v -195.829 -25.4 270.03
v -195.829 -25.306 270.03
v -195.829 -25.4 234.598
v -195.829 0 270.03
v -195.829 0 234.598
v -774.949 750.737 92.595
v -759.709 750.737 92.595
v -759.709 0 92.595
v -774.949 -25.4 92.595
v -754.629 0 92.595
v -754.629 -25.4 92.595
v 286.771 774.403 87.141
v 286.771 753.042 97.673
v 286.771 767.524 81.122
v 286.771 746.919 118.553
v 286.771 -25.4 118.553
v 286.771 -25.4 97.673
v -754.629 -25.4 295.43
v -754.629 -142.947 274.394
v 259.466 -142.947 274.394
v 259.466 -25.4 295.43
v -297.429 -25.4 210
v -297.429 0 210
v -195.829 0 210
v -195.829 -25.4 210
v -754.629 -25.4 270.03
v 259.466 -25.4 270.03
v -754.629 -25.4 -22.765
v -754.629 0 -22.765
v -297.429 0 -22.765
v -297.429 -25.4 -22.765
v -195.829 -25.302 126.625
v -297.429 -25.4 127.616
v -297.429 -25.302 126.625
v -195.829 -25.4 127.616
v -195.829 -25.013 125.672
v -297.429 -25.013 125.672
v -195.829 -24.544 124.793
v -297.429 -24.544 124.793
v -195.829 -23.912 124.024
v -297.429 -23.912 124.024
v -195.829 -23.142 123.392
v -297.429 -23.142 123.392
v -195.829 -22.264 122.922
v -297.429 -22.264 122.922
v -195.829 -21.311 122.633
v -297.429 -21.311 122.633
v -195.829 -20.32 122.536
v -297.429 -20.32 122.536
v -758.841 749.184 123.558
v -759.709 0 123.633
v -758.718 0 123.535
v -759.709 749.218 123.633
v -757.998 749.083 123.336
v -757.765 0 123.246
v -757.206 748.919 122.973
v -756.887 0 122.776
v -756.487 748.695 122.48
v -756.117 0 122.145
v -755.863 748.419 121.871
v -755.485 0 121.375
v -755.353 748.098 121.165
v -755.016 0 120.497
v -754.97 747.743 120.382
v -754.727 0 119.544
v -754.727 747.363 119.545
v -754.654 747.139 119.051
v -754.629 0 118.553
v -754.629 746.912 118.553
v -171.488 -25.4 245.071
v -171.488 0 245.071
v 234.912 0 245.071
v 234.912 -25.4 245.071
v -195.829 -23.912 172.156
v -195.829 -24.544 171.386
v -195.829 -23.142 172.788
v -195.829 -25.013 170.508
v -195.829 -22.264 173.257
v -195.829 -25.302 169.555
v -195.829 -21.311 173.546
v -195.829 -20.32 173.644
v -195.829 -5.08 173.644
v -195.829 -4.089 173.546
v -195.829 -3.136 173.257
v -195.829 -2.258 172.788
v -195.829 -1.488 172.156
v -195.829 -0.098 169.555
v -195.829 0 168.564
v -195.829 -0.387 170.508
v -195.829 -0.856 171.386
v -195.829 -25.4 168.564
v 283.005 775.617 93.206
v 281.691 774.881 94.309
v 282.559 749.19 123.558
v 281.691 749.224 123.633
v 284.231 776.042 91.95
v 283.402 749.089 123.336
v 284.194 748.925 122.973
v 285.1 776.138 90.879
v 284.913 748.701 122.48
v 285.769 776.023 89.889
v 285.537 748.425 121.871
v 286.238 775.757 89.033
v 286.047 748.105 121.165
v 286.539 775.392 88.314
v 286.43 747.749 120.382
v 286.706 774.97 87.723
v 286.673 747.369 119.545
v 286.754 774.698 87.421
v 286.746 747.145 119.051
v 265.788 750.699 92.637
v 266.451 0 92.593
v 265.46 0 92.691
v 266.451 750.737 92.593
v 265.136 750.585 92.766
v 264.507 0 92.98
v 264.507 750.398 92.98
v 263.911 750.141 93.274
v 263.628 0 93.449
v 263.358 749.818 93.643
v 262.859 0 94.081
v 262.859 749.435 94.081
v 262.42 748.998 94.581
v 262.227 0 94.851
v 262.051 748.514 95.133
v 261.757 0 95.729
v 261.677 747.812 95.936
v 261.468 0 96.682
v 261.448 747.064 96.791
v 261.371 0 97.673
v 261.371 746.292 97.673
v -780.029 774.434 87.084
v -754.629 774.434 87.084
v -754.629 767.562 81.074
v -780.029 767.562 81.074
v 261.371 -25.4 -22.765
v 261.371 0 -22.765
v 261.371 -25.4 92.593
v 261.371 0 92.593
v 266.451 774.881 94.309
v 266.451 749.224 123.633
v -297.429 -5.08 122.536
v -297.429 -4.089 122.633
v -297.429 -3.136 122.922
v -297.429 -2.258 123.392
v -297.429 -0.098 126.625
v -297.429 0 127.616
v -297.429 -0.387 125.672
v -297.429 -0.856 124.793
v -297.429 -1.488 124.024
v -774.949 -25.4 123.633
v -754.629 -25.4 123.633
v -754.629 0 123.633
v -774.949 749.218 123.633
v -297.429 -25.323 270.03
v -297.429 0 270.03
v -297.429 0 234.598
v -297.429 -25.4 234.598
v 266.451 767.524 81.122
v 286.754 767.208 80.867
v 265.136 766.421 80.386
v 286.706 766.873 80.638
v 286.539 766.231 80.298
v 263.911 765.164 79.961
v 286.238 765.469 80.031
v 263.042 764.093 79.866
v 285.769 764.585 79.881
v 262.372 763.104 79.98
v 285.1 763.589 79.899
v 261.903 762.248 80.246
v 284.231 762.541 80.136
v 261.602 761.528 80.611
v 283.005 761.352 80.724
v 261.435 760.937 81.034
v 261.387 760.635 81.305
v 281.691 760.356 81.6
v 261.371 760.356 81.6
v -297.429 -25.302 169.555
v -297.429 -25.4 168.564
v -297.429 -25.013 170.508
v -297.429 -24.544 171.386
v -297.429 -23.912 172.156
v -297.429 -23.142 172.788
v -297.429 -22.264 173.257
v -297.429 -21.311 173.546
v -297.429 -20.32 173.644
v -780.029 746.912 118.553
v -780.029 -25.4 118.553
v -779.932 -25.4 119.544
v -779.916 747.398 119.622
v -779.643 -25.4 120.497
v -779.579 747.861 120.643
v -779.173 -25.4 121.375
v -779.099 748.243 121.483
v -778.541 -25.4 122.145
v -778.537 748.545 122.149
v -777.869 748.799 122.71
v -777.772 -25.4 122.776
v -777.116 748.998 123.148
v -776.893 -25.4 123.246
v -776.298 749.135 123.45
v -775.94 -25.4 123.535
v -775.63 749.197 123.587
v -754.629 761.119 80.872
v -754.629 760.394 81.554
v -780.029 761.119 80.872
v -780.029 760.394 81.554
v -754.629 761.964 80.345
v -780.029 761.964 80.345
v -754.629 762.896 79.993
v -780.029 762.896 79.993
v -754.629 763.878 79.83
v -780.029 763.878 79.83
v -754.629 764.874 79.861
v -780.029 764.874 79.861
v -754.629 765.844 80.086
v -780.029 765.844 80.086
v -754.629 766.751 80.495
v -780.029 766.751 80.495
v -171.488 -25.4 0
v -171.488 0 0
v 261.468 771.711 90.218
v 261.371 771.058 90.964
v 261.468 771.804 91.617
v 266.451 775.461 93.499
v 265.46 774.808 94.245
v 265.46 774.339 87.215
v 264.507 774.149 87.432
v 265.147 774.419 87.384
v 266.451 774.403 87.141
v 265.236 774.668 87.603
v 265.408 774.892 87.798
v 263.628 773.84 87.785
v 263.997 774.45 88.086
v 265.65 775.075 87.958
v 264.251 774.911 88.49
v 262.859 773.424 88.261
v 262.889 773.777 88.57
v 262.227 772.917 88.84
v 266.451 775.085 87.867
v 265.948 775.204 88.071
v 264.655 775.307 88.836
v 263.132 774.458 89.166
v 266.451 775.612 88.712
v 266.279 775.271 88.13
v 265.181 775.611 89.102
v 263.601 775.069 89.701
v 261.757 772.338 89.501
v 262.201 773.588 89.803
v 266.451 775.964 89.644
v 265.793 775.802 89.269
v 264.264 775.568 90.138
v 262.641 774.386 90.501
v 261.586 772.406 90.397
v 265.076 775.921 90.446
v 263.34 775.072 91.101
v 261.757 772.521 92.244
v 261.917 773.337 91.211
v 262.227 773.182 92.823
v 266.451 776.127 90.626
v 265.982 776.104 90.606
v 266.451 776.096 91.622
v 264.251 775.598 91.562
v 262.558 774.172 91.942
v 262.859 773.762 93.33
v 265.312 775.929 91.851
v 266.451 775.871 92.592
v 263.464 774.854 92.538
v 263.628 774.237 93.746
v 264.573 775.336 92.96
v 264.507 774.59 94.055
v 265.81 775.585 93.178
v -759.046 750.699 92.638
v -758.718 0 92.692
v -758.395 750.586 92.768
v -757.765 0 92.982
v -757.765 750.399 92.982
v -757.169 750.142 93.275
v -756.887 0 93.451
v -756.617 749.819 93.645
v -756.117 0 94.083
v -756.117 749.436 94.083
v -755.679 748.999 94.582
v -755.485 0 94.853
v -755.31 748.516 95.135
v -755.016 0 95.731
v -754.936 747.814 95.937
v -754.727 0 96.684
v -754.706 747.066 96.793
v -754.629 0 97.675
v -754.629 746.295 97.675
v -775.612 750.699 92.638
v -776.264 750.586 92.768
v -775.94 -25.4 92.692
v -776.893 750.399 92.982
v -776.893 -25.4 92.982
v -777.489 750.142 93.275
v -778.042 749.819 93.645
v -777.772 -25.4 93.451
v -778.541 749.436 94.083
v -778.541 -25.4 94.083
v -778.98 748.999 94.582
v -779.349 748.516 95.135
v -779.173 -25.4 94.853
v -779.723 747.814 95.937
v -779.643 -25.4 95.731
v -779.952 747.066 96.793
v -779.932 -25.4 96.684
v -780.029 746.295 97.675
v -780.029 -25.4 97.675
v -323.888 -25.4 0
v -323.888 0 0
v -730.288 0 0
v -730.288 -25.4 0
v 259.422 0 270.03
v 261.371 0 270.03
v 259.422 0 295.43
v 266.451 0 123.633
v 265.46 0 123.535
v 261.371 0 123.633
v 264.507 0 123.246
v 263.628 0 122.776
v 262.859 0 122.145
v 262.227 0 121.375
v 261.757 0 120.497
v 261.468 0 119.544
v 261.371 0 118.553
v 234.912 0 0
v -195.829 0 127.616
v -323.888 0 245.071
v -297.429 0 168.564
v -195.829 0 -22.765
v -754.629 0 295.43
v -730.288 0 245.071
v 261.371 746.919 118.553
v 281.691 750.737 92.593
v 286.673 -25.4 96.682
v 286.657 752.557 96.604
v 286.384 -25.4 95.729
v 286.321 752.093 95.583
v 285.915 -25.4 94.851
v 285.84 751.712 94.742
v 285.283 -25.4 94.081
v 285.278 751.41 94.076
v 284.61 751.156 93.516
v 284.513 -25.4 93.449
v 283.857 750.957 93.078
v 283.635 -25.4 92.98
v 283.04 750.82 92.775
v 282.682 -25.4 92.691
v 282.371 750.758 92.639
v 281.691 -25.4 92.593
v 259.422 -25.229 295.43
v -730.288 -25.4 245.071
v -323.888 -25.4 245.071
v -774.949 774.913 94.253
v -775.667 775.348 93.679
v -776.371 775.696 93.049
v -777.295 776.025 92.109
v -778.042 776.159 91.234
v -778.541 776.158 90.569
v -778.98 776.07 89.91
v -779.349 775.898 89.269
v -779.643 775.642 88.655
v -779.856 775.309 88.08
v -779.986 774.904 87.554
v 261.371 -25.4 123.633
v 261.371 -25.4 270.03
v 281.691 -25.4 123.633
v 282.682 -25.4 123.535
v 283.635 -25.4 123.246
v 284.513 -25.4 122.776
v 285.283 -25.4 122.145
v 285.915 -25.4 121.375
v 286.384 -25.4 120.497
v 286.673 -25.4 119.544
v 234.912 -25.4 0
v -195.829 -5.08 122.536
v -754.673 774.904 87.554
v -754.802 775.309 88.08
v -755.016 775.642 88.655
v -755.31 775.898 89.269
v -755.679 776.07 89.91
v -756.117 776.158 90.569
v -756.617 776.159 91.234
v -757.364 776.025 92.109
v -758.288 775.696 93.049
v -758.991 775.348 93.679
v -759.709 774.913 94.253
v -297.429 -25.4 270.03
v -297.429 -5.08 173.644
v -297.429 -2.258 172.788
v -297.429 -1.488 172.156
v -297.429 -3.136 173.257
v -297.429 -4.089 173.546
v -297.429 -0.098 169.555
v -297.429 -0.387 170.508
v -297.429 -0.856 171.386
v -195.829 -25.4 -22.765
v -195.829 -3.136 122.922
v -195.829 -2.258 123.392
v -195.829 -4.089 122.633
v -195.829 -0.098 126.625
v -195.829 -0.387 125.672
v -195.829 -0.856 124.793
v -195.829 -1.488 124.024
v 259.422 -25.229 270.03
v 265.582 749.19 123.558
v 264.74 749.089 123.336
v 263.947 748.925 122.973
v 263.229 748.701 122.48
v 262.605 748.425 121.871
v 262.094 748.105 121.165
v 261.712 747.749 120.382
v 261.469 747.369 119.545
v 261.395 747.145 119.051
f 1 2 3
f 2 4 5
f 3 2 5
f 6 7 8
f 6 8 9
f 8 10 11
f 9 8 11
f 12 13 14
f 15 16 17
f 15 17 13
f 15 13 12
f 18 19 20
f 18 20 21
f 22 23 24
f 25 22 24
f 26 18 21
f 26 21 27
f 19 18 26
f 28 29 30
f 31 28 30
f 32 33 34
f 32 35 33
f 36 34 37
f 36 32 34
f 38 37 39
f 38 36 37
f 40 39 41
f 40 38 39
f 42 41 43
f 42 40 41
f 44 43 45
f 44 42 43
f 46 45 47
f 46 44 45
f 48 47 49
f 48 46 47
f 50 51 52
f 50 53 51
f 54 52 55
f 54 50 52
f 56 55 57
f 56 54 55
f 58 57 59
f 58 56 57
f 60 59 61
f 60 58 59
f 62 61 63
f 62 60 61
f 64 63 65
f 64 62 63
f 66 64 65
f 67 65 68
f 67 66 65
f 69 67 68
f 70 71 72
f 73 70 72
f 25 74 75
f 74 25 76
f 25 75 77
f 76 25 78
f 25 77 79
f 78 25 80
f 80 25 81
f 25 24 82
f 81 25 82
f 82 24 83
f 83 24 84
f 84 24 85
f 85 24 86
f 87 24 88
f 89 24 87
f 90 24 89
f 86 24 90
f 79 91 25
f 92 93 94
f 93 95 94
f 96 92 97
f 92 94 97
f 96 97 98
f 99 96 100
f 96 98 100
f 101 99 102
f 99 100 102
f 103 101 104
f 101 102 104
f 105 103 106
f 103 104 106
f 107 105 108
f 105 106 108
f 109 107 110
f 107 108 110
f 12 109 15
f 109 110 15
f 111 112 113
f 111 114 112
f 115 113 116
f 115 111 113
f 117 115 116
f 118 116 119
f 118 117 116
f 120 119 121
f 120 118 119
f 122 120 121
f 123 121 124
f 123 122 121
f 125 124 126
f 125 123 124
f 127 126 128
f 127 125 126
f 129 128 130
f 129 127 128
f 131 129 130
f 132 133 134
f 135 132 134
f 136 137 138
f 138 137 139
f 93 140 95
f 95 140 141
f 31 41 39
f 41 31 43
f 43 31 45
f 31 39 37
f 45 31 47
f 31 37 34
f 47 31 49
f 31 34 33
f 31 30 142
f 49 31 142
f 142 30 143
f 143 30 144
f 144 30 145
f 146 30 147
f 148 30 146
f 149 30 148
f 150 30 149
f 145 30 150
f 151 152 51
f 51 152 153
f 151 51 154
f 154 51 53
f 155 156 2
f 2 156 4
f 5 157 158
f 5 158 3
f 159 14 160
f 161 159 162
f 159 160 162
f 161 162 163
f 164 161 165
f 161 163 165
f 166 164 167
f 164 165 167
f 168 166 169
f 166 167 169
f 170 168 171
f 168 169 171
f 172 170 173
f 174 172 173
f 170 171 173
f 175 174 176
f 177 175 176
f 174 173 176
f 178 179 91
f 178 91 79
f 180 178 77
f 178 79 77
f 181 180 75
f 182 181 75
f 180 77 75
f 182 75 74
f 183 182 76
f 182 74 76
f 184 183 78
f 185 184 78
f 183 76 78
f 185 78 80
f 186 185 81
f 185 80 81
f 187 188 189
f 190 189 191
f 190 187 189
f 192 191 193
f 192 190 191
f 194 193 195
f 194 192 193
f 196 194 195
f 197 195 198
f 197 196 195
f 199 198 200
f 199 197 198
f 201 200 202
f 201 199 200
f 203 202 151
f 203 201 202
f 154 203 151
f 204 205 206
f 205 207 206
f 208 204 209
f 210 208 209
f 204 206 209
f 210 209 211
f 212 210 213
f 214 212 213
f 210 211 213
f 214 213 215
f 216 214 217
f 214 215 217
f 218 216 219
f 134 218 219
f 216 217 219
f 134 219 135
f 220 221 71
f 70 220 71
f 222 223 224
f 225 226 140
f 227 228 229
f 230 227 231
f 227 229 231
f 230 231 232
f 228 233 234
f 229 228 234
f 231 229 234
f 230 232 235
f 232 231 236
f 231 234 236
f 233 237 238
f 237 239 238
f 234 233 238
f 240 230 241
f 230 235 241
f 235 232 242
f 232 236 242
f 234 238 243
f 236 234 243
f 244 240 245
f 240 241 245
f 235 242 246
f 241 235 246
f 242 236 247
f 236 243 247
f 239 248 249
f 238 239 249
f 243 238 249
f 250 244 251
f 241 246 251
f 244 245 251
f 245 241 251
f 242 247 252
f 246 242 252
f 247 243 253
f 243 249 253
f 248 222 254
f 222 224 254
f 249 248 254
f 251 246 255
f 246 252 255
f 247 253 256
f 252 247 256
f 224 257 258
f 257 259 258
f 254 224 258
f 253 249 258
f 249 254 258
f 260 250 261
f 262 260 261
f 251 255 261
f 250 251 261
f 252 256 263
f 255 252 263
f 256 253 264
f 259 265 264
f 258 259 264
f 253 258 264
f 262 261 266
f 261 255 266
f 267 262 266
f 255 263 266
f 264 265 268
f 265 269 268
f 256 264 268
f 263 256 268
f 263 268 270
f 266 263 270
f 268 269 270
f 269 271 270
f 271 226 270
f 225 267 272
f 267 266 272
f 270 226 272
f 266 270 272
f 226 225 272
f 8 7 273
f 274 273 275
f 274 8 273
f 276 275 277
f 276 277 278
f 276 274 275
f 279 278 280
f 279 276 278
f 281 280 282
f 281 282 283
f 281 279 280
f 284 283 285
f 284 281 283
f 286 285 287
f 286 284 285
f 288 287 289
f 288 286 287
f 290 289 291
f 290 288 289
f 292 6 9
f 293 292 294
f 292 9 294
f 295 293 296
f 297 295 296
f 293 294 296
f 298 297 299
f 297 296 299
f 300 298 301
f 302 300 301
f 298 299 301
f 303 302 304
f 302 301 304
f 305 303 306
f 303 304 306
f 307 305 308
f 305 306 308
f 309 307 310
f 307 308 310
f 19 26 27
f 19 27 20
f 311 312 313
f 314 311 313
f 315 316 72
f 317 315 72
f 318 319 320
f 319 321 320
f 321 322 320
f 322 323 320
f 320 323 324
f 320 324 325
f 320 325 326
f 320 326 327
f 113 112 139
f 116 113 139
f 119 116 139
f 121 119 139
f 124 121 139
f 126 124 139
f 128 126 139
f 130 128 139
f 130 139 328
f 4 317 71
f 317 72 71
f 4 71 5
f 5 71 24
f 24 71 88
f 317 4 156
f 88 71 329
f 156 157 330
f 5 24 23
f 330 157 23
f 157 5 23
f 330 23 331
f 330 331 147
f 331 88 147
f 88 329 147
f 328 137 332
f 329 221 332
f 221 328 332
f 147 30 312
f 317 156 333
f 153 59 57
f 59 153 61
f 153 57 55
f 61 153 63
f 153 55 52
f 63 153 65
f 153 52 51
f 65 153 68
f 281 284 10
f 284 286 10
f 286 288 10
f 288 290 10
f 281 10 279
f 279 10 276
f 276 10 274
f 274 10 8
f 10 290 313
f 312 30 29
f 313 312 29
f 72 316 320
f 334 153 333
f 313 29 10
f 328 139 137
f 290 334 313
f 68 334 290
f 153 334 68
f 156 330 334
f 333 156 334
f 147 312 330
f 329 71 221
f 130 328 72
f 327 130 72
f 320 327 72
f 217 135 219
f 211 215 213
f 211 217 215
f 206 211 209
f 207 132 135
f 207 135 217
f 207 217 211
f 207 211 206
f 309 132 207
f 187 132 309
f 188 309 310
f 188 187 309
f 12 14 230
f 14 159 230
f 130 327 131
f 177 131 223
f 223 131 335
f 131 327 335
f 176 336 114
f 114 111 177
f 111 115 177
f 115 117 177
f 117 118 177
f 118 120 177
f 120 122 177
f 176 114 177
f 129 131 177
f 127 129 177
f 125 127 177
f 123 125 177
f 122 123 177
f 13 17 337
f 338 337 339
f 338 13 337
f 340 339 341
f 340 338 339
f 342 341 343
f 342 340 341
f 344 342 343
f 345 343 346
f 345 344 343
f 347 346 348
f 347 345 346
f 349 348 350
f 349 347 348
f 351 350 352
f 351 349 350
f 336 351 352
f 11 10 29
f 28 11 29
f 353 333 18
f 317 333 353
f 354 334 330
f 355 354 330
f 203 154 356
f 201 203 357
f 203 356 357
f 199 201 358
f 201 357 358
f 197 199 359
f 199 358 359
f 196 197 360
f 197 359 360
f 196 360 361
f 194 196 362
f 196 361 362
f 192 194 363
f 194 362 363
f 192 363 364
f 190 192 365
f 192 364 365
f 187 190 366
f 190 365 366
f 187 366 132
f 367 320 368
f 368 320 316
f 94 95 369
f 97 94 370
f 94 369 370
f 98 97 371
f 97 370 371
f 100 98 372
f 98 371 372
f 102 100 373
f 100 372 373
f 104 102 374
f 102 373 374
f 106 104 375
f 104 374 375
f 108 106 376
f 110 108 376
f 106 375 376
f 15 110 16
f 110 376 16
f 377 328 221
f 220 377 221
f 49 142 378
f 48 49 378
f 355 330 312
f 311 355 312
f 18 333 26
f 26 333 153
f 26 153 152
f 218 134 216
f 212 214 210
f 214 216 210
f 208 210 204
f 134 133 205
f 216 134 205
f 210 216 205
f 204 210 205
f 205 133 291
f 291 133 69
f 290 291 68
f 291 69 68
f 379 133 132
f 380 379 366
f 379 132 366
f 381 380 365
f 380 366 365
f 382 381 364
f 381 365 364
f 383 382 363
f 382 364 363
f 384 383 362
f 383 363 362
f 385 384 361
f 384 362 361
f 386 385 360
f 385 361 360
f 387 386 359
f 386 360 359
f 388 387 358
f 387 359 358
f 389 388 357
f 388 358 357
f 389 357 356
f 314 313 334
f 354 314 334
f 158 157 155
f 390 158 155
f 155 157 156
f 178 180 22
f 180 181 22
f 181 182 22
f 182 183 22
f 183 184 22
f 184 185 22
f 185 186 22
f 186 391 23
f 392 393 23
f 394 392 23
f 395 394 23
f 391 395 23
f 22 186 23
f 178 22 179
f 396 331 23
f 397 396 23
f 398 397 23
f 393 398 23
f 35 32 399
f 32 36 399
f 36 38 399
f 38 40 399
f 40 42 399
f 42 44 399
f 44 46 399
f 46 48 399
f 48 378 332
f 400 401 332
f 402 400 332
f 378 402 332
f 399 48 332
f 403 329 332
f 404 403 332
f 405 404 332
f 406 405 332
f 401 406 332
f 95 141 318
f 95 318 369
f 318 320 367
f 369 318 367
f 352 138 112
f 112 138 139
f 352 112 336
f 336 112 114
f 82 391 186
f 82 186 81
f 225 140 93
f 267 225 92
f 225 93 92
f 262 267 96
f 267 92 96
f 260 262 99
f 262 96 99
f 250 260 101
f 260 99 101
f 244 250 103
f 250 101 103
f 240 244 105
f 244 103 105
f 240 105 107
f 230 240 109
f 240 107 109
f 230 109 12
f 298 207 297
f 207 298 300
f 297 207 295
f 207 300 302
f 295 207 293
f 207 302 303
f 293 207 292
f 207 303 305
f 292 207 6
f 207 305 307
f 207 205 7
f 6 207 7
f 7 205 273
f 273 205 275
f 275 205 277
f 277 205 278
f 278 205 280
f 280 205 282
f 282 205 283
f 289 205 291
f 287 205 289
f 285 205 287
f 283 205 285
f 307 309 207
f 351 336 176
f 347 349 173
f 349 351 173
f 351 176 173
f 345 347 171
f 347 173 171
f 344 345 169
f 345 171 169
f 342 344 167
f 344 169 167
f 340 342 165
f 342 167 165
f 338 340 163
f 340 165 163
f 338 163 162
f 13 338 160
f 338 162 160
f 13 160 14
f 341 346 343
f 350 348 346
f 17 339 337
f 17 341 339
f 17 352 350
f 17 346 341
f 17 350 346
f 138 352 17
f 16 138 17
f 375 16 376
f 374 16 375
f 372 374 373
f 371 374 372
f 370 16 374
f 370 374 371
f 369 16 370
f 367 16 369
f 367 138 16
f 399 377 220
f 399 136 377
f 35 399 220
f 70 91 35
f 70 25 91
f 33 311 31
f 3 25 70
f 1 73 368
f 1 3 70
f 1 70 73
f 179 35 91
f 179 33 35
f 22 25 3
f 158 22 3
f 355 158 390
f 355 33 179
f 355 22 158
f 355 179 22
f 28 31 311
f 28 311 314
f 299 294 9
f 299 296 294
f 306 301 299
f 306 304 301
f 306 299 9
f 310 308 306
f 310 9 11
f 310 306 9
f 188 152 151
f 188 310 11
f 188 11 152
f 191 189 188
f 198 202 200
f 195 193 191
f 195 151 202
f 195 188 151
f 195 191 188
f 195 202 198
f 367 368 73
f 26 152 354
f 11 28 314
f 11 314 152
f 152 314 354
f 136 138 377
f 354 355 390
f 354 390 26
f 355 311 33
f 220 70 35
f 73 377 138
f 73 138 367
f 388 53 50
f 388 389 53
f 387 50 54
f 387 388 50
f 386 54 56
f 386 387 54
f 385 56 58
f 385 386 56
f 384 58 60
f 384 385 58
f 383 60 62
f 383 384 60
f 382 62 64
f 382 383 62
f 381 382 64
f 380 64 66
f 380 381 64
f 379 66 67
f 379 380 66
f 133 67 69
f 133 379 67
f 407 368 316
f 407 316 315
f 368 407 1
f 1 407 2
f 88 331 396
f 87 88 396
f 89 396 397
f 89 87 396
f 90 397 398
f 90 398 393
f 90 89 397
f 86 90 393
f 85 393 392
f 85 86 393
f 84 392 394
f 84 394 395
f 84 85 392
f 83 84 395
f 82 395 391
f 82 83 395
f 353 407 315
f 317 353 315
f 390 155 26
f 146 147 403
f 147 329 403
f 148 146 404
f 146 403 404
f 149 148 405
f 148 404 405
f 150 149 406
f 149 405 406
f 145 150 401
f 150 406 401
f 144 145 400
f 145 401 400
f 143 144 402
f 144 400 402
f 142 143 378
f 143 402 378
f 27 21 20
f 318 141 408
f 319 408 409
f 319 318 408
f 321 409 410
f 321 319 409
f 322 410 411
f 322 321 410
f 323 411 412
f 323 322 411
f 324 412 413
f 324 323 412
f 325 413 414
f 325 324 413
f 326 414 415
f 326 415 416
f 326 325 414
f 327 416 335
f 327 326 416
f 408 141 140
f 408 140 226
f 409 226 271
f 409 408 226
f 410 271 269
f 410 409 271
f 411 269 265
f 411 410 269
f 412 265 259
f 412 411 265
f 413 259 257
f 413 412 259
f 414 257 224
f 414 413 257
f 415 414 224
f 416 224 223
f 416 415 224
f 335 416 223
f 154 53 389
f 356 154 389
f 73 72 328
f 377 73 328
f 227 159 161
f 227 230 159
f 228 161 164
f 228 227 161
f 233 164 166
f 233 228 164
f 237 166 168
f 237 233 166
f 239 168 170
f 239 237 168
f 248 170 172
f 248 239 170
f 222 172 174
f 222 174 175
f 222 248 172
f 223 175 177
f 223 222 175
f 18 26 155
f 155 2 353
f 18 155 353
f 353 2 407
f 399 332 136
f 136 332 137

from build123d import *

# Parameters (mm, degrees)
F0_W     = 26.4591541143
F0_H     = 51.1078872686
F0_W_2   = 101.6
F0_W_3   = 24.3408458857
F0_H_2   = 24.597927928
F1_DEPTH = 25.4
F2_W     = 25.4
F2_H     = 31.037738815
F3_DEPTH = 25.4
F4_W     = 25.4
F4_H     = 31.0394611481
F5_DEPTH = 25.4
F7_DEPTH = 25.4
F9_DEPTH = 1014.095
F10_R    = 5.08
F11_R    = 5.08


# Not quite as in the source:
# - two fillets or chamfers of one size are made in one step


with BuildPart() as f1:
    # F0 (on Front) → F1 (new body)
    with BuildSketch(Plane.XZ):
        Polygon((-730.28846806, 0), (-730.28846806, 245.0714976708), (-323.88846806, 245.0714976708), (-323.88846806, 173.643636104), (-297.4293139458, 173.643636104), (-297.4293139458, 210.000038147), (-297.4293139458, 234.5979660749), (-297.4293139458, 270.0304389), (-754.6293139458, 270.0304389), (-754.6293139458, -22.7653142065), (-297.4293139458, -22.7653142065), (-297.4293139458, 122.5357488354), (-323.88846806, 122.5357488354), (-323.88846806, 0), align=None)
        with Locations((-310.6588910029, 148.0896924697)):
            Rectangle(F0_W, F0_H)
        with Locations((-246.6293139458, 148.0896924697)):
            Rectangle(F0_W_2, F0_H)
        Polygon((-195.8293139458, 210.000038147), (-195.8293139458, 173.643636104), (-171.48846806, 173.643636104), (-171.48846806, 245.0714976708), (234.91153194, 245.0714976708), (234.91153194, 0), (-171.48846806, 0), (-171.48846806, 122.5357488354), (-195.8293139458, 122.5357488354), (-195.8293139458, -22.7653142065), (261.3706860542, -22.7653142065), (261.3706860542, 270.0304389), (-195.8293139458, 270.0304389), (-195.8293139458, 234.5979660749), align=None)
        with Locations((-183.6588910029, 148.0896924697)):
            Rectangle(F0_W_3, F0_H)
        with Locations((-246.6293139458, 222.299002111)):
            Rectangle(F0_W_2, F0_H_2)
    extrude(amount=F1_DEPTH)

    # F2 (on face) → F3 (join)
    with BuildSketch(Plane(origin=(-754.6293139458, 0, 0), x_dir=(0, -1, 0), z_dir=(-1, 0, 0))):
        Polygon((0, 92.5948235318), (0, 123.6325623468), (-749.2181062698, 123.6325623468), (-778.2575488091, 90.4286950827), (-763.7378275394, 77.7300353711), (-750.7373791816, 92.5948235318), align=None)
        with Locations((12.7, 108.1136929393)):
            Rectangle(F2_W, F2_H)
    extrude(amount=F3_DEPTH)

    # F4 (on face) → F5 (join)
    with BuildSketch(Plane.YZ.offset(261.3706860542)):
        with Locations((-12.7, 108.1128317727)):
            Rectangle(F4_W, F4_H)
        Polygon((749.224126339, 123.6325623468), (0, 123.6325623468), (0, 92.5931011987), (750.7367628879, 92.5931011987), (763.7009845333, 77.7766145807), (778.2266139984, 90.4863402247), align=None)
    extrude(amount=F5_DEPTH)

    # F6 (on face) → F7 (join)
    with BuildSketch(Plane.XY.offset(270.0304389)):
        Polygon((259.4215273857, 0), (-754.6293139458, 0), (-754.6293139458, -25.4), (259.4215273857, -25.2286773175), align=None)
    extrude(amount=F7_DEPTH)

    # F10
    f10_edges = [f1.edges().sort_by_distance(p)[0] for p in [
        (-246.629314, -25.4, 173.643636),
        (-246.629314, -25.4, 122.535749),
        (-246.629314, 0, 173.643636),
        (-246.629314, 0, 122.535749),
    ]]
    fillet(f10_edges, radius=F10_R)

    # F11
    f11_edges = [f1.edges().sort_by_distance(p)[0] for p in [
        (-754.629314, 374.609053, 123.632562),
        (-780.029314, 361.909053, 123.632562),
        (-780.029314, 362.66869, 92.594824),
        (-754.629314, 375.36869, 92.594824),
        (-767.329314, 778.257549, 90.428695),
        (-780.029314, 763.737828, 107.030629),
        (-767.329314, 763.737828, 77.730035),
        (-754.629314, 763.737828, 107.030629),
        (261.370686, 375.368381, 92.593101),
        (286.770686, 362.668381, 92.593101),
        (286.770686, 757.218874, 85.184858),
        (286.770686, 763.72537, 107.059451),
        (286.770686, 361.912063, 123.632562),
        (261.370686, 374.612063, 123.632562),
        (274.070686, 763.700985, 77.776615),
        (261.370686, 763.72537, 107.059451),
        (261.370686, 770.963799, 84.131477),
        (274.070686, 778.226614, 90.48634),
    ]]
    fillet(f11_edges, radius=F11_R)


with BuildPart() as f9:
    # F8 (on face) → F9 (new body)
    with BuildSketch(Plane(origin=(-754.6293139458, 0, 0), x_dir=(0, -1, 0), z_dir=(-1, 0, 0))):
        Polygon((142.9468989372, 274.3944525719), (25.4, 295.4304389), (25.4, 270.0304389), align=None)
    extrude(amount=-F9_DEPTH)


solid = Compound([f1.part, f9.part])
